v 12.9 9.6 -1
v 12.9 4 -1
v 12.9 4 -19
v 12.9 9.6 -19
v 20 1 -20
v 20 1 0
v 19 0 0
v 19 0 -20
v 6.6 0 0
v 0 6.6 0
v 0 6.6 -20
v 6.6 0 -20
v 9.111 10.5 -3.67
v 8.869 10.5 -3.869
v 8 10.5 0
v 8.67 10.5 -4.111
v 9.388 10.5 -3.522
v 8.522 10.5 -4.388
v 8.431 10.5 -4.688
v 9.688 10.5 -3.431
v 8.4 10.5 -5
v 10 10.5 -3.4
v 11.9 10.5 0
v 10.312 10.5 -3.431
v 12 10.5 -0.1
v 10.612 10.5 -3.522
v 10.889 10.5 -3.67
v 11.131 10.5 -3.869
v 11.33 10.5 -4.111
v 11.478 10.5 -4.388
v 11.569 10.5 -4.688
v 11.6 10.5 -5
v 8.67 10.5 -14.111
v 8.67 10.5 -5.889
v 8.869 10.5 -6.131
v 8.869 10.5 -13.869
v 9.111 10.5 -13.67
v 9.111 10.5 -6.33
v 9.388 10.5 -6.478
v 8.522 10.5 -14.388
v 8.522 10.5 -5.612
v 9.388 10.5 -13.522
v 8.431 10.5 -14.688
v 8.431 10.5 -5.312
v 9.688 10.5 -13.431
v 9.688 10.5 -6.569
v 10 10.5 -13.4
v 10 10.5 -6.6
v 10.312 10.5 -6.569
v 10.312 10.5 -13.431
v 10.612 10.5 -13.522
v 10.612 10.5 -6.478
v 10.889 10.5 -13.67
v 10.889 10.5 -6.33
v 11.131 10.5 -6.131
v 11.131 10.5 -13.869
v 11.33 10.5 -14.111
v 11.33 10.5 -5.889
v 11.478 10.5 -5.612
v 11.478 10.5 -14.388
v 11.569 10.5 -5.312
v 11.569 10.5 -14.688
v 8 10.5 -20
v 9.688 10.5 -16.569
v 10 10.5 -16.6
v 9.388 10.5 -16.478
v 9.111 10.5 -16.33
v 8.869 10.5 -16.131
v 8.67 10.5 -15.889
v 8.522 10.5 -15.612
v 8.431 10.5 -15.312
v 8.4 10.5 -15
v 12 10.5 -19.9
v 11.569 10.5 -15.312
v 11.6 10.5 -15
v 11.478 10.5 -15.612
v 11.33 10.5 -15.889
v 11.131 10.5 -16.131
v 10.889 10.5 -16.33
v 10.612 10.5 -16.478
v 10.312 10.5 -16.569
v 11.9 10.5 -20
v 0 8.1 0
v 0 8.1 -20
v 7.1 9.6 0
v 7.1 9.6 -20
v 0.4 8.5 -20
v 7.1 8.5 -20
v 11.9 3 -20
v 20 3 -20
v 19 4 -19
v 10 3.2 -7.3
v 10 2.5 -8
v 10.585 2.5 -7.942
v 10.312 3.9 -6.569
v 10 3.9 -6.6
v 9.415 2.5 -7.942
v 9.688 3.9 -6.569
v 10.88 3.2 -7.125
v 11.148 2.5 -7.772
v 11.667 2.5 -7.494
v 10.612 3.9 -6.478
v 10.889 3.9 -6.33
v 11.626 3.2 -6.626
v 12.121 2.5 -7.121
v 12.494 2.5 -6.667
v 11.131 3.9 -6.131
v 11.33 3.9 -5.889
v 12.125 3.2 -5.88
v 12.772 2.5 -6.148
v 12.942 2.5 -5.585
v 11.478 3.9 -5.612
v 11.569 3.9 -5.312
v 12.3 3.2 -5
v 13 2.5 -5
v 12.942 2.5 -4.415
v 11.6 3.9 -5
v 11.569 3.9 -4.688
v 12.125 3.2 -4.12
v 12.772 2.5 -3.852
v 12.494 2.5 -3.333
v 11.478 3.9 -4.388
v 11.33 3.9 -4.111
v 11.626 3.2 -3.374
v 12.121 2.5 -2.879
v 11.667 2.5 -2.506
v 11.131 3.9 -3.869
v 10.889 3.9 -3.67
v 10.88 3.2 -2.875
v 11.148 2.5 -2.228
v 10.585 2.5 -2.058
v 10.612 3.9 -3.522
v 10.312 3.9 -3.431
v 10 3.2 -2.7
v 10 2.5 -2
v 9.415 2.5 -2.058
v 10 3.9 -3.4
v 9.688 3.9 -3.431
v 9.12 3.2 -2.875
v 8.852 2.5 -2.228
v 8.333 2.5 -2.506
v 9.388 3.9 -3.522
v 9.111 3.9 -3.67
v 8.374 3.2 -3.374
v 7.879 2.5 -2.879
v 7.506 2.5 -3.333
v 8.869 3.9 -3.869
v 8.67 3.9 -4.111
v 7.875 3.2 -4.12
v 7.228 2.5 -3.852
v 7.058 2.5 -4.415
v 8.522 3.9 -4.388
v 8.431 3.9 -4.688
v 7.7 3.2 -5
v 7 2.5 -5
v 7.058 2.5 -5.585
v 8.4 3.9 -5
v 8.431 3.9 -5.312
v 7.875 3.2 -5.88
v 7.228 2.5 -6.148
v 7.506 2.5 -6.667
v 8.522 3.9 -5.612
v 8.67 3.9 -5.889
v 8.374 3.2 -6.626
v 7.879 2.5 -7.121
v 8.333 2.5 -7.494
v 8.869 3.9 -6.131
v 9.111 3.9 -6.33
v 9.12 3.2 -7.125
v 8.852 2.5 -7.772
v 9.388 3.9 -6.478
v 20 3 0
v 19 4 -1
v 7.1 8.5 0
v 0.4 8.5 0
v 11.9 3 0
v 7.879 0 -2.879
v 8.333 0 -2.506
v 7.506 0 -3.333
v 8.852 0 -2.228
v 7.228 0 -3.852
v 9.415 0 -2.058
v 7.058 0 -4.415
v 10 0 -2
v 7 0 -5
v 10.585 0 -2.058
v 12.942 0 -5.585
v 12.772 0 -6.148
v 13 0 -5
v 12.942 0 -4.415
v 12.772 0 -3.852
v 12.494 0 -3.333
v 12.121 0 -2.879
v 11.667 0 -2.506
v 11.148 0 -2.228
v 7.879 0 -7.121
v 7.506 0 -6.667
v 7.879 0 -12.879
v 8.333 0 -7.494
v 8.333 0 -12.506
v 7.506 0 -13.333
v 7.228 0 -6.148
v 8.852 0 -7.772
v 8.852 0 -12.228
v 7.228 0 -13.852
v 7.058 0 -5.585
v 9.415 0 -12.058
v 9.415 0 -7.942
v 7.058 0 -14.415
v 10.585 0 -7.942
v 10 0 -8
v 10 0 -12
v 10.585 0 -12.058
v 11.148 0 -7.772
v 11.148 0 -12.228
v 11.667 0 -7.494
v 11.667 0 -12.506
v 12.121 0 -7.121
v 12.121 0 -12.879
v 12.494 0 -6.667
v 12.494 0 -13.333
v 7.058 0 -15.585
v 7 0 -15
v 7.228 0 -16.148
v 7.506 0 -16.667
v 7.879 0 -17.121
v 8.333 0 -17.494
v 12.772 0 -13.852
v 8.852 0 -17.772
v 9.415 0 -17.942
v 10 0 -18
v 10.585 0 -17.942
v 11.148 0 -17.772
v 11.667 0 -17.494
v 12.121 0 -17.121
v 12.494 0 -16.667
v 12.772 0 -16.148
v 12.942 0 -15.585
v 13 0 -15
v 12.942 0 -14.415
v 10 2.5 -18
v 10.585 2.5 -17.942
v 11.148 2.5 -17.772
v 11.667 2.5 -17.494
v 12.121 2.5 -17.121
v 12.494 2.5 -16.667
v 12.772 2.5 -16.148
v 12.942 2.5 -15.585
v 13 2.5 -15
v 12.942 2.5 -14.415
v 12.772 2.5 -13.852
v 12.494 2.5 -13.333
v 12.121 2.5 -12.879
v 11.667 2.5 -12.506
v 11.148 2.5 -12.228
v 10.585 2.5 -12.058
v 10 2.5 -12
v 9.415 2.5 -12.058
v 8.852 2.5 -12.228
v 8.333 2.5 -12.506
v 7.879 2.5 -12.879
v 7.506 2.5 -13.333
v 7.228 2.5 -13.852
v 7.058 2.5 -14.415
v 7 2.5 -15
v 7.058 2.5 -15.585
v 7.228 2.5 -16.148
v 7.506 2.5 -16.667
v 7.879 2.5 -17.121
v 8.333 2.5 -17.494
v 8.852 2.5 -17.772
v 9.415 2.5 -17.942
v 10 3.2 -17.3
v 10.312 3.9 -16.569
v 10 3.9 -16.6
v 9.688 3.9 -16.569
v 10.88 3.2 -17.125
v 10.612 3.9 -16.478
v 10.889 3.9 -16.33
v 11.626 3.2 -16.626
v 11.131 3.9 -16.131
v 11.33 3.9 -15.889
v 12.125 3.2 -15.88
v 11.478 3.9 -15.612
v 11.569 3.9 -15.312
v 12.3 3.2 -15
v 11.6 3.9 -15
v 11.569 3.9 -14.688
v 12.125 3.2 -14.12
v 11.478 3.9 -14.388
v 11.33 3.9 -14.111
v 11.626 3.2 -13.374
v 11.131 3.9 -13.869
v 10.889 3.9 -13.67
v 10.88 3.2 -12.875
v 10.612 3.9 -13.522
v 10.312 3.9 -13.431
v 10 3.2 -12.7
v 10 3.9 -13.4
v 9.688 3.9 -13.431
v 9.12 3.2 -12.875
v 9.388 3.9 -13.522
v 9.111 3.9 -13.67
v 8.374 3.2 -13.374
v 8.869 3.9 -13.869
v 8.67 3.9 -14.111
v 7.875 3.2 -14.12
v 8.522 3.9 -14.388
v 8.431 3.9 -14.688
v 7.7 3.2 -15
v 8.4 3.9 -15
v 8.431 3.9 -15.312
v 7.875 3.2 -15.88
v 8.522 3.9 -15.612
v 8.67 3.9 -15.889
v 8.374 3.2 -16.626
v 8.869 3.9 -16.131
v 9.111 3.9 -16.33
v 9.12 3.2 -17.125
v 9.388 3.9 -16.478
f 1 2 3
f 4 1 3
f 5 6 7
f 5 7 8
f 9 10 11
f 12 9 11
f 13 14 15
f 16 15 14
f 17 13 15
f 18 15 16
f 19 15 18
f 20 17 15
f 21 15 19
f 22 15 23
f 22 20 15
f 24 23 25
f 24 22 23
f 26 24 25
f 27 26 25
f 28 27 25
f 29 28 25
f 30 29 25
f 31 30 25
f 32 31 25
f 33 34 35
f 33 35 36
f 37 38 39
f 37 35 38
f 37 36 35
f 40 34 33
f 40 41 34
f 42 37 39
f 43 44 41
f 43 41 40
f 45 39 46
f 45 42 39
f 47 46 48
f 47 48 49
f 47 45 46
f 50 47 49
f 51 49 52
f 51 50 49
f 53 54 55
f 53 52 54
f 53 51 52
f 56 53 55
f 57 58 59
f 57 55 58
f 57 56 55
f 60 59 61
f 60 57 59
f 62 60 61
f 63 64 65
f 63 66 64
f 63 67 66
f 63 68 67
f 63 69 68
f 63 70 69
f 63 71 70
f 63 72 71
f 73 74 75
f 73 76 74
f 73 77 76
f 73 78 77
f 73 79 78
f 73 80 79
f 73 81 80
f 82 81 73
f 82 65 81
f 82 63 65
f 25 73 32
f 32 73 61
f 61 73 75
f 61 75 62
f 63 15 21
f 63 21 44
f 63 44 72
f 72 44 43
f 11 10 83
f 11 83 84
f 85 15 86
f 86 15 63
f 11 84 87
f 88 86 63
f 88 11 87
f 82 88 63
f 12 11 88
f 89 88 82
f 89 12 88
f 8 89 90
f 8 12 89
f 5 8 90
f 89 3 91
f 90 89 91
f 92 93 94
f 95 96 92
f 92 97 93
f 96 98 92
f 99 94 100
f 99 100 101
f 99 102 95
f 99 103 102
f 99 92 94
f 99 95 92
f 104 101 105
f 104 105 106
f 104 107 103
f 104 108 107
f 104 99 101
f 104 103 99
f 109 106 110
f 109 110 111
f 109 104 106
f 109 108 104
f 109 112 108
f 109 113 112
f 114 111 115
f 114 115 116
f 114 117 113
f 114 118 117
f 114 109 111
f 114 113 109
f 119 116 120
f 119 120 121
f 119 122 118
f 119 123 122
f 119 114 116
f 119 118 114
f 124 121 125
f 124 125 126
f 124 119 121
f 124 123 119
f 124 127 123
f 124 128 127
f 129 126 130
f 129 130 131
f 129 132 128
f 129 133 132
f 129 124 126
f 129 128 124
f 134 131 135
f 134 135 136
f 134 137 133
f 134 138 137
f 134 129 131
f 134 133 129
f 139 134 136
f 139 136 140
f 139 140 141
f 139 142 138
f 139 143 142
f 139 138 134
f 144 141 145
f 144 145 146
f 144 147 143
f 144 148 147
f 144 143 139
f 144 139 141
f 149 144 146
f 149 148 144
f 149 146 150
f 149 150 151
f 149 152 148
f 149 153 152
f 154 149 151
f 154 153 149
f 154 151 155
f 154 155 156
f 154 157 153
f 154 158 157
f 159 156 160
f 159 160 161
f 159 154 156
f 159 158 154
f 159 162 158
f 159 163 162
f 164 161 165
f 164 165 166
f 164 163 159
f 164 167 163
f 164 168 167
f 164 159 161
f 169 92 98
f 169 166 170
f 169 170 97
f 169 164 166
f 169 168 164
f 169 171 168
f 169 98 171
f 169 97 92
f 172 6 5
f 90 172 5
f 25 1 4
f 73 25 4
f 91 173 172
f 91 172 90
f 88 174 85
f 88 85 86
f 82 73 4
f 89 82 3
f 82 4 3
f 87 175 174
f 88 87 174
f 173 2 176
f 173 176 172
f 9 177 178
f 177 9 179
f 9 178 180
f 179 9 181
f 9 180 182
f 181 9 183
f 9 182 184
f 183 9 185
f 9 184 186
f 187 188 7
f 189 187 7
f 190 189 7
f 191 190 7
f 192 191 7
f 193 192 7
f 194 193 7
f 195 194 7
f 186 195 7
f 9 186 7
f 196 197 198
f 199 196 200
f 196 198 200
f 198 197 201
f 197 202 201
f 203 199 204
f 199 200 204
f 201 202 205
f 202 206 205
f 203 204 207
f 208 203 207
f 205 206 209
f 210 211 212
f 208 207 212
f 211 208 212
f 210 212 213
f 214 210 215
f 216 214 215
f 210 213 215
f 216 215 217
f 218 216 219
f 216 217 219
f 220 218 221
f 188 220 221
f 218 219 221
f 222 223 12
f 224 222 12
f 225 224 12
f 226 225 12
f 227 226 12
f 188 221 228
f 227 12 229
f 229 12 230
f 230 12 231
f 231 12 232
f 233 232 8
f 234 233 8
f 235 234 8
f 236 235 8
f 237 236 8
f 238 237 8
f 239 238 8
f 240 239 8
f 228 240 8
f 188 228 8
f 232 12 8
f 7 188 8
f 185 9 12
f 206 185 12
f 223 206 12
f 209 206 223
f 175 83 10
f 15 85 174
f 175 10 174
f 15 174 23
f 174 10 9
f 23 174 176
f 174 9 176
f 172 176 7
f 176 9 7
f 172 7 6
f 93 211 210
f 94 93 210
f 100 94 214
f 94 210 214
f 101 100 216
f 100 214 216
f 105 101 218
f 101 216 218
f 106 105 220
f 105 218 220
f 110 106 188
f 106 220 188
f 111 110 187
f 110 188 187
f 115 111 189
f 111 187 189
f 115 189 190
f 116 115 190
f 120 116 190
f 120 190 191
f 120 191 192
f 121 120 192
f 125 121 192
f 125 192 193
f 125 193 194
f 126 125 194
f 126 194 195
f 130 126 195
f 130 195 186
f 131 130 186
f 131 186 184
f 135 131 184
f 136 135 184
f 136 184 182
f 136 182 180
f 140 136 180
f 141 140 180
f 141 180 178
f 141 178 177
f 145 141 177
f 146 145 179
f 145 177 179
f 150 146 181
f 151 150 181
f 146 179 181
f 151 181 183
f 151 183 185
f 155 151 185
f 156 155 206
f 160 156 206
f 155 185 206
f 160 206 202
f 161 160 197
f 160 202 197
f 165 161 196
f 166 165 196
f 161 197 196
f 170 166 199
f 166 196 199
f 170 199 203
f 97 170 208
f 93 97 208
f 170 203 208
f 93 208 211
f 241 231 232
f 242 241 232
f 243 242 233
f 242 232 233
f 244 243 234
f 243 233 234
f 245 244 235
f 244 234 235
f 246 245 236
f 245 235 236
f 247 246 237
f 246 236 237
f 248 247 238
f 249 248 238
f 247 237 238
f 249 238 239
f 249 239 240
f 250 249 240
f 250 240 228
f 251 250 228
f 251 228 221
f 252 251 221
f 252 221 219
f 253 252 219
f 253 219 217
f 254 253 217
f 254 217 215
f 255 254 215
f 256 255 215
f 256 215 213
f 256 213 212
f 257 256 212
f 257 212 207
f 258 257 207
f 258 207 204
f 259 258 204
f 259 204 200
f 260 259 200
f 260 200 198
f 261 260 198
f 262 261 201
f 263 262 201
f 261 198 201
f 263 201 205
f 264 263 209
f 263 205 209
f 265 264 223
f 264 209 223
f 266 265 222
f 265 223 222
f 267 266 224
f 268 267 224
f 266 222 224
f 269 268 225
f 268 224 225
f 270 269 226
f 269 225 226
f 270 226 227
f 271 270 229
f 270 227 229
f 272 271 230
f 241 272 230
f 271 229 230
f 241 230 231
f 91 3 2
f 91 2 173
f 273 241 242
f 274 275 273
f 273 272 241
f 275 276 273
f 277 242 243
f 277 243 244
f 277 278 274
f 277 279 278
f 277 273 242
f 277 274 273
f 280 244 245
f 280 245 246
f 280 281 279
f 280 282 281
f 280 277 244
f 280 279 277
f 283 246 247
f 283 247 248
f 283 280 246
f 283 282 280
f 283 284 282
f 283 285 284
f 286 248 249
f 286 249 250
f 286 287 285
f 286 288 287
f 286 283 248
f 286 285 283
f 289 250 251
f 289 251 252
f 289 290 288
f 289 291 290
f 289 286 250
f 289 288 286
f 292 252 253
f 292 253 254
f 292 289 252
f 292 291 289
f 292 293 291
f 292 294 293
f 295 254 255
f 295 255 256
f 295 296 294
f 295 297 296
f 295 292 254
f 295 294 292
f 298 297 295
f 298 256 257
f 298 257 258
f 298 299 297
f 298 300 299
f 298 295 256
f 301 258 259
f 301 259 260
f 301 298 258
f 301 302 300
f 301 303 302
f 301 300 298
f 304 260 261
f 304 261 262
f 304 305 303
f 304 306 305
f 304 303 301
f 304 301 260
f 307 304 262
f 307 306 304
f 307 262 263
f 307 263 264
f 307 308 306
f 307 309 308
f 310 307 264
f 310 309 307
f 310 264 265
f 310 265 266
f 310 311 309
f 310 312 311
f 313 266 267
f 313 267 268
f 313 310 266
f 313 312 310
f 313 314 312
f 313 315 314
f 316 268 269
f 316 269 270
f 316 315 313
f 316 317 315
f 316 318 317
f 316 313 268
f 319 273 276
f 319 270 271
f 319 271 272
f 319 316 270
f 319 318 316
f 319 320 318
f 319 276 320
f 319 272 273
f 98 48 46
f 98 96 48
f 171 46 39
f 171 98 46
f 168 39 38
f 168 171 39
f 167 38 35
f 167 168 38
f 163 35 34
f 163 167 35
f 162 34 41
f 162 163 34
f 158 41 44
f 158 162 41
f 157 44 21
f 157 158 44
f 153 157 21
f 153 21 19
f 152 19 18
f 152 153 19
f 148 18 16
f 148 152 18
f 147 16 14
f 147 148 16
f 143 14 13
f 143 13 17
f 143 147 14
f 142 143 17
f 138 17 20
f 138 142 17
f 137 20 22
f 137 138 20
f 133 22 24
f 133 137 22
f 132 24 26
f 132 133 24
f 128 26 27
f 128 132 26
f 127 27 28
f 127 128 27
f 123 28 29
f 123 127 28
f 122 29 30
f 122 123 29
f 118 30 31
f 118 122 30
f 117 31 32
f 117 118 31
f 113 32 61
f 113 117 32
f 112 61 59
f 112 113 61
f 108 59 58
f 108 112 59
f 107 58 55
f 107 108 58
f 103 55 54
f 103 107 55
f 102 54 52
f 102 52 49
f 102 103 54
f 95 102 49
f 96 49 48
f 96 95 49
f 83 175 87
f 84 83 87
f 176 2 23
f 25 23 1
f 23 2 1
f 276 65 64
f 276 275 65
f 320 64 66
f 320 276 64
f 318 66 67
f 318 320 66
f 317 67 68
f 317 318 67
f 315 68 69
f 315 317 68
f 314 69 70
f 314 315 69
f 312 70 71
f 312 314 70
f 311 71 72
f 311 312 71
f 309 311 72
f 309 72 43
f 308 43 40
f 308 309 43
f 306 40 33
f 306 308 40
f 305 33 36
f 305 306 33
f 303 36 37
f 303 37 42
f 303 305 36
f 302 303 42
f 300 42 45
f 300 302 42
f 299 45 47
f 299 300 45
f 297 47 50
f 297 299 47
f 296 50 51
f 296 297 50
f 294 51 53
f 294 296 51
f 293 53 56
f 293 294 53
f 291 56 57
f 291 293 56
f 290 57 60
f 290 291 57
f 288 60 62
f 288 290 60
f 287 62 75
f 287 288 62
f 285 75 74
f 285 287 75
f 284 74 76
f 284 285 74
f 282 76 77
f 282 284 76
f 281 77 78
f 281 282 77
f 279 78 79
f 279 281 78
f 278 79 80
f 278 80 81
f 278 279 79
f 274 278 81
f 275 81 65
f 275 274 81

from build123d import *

# Parameters (mm, degrees)
SKETCH_1_W          = 20
SKETCH_1_H          = 20
EXTRUDE_1_DEPTH     = 4
SKETCH_2_W          = 12.9
SKETCH_2_H          = 20
EXTRUDE_2_DEPTH     = 4.5
SKETCH_3_R          = 1.6
CUT_EXTRUDE_1_DEPTH = 30.533878851
SKETCH_4_W          = 5.8
SKETCH_4_H          = 20
SKETCH_4_R          = 1.6
EXTRUDE_3_DEPTH     = 2
SKETCH_5_R          = 3
CUT_EXTRUDE_3_DEPTH = 2.4
CHAMFER_3_SIZE      = 1.5
CHAMFER_1_SIZE      = 6.6
CHAMFER_2_SIZE      = 1
CHAMFER_4_SIZE      = 0.4
CHAMFER_5_SIZE      = 0.9


with BuildPart() as part:
    # 草图1 → 凸台-拉伸1 (new body)
    with BuildSketch(Plane(origin=(0, 0, 0), x_dir=(1, 0, 0), z_dir=(0, 1, 0))):
        with Locations((10, 10)):
            Rectangle(SKETCH_1_W, SKETCH_1_H)
    extrude(amount=EXTRUDE_1_DEPTH)

    # 草图2 → 凸台-拉伸2 (add)
    with BuildSketch(Plane(origin=(0, 4, 0), x_dir=(1, 0, 0), z_dir=(0, 1, 0))):
        with Locations((6.45, 10)):
            Rectangle(SKETCH_2_W, SKETCH_2_H)
    extrude(amount=EXTRUDE_2_DEPTH)

    # 草图3 → 切除-拉伸1 (cut, through all)
    with BuildSketch(Plane(origin=(0, 0, 0), x_dir=(-1, 0, 0), z_dir=(0, -1, 0))):
        with Locations(Location((-10, 5, 0), (0, 0, 90))):
            Circle(SKETCH_3_R)
        with Locations(Location((-10, 15, 0), (0, 0, 90))):
            Circle(SKETCH_3_R)
    extrude(amount=-CUT_EXTRUDE_1_DEPTH, mode=Mode.SUBTRACT)

    # 草图4 → 凸台-拉伸3 (add)
    with BuildSketch(Plane(origin=(0, 8.5, 0), x_dir=(1, 0, 0), z_dir=(0, 1, 0))):
        with Locations((10, 10)):
            Rectangle(SKETCH_4_W, SKETCH_4_H)
        with Locations(Location((10, 15, 0), (0, 0, 90))):
            Circle(SKETCH_4_R, mode=Mode.SUBTRACT)
        with Locations(Location((10, 5, 0), (0, 0, 90))):
            Circle(SKETCH_4_R, mode=Mode.SUBTRACT)
    extrude(amount=EXTRUDE_3_DEPTH)

    # 草图5 → 切除-拉伸3 (cut)
    with BuildSketch(Plane(origin=(0, 0, 0), x_dir=(-1, 0, 0), z_dir=(0, -1, 0))):
        with Locations(Location((-10, 5, 0), (0, 0, 90))):
            Circle(SKETCH_5_R)
        with Locations(Location((-10, 15, 0), (0, 0, 90))):
            Circle(SKETCH_5_R)
    extrude(amount=-CUT_EXTRUDE_3_DEPTH, mode=Mode.SUBTRACT)

    # 倒角3
    # the kernel refuses this chamfer: 1.5 mm, written as the material it takes off along each edge
    with BuildSketch(Plane(origin=(10, 2.4, -15), x_dir=(0, 0, -1), z_dir=(-1, 0, 0))) as chamfer_3_piece_1_section:
        Polygon((1.6 + CHAMFER_3_SIZE, 0), (1.6, -CHAMFER_3_SIZE), (1.6, 0), align=None)
    chamfer_3_piece_1 = revolve(axis=Axis((10, 2.4, -15), (0, -1, 0)), mode=Mode.PRIVATE)
    chamfer_3_piece_1 = chamfer_3_piece_1 & Plane(origin=(10, 3.20338318, -15), x_dir=(0, 0, -1), z_dir=(0, -1, 0)) * Cylinder(3, 13, mode=Mode.PRIVATE)
    add(chamfer_3_piece_1, mode=Mode.SUBTRACT)
    with BuildSketch(Plane(origin=(10, 2.4, -5), x_dir=(0, 0, -1), z_dir=(-1, 0, 0))) as chamfer_3_piece_2_section:
        Polygon((1.6 + CHAMFER_3_SIZE, 0), (1.6, -CHAMFER_3_SIZE), (1.6, 0), align=None)
    chamfer_3_piece_2 = revolve(axis=Axis((10, 2.4, -5), (0, -1, 0)), mode=Mode.PRIVATE)
    chamfer_3_piece_2 = chamfer_3_piece_2 & Plane(origin=(10, 3.20338318, -5), x_dir=(0, 0, -1), z_dir=(0, -1, 0)) * Cylinder(3, 13, mode=Mode.PRIVATE)
    add(chamfer_3_piece_2, mode=Mode.SUBTRACT)

    # 倒角1
    chamfer_1_edges = [part.edges().sort_by_distance(p)[0] for p in [
        (0, 0, -10),
    ]]
    chamfer(chamfer_1_edges, length=CHAMFER_1_SIZE)

    # 倒角2
    chamfer_2_edges = [part.edges().sort_by_distance(p)[0] for p in [
        (20, 4, -10),
        (16.45, 4, 0),
        (12.9, 7.25, 0),
        (12.9, 7.25, -20),
        (16.45, 4, -20),
        (20, 0, -10),
    ]]
    chamfer(chamfer_2_edges, length=CHAMFER_2_SIZE)

    # 倒角4
    chamfer_4_edges = [part.edges().sort_by_distance(p)[0] for p in [
        (0, 8.5, -10),
    ]]
    chamfer(chamfer_4_edges, length=CHAMFER_4_SIZE)

    # 倒角5
    chamfer_5_edges = [part.edges().sort_by_distance(p)[0] for p in [
        (7.1, 10.5, -10),
        (12.9, 10.5, -10),
    ]]
    chamfer(chamfer_5_edges, length=CHAMFER_5_SIZE)


solid = part.part
